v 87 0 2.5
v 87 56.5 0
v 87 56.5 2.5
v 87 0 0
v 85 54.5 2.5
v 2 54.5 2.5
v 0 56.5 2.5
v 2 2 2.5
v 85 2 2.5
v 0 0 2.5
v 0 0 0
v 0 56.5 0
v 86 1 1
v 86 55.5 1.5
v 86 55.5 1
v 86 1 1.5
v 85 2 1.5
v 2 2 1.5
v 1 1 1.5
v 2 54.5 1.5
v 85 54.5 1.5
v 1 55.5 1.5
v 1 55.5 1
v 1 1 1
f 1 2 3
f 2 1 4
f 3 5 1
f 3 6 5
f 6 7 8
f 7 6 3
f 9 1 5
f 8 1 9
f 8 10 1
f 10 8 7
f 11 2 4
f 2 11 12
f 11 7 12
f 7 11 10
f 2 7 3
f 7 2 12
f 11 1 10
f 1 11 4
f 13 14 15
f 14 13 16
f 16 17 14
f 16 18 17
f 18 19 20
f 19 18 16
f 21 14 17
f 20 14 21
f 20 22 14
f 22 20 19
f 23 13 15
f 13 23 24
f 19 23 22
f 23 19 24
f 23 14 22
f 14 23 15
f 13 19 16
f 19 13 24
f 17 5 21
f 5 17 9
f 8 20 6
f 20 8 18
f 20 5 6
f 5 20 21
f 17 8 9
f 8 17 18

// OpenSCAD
width = 85;
height = 54.5;
thickness = 0.5;

difference() {
    
    cube([width + 2,height + 2, 1 + thickness + 1]);
    translate([1,1,1]) {
        cube([width, height,thickness]);
    }
    translate([2,2,1]) {
        cube([width - 2, height - 2, thickness + 1]);
    }
}
